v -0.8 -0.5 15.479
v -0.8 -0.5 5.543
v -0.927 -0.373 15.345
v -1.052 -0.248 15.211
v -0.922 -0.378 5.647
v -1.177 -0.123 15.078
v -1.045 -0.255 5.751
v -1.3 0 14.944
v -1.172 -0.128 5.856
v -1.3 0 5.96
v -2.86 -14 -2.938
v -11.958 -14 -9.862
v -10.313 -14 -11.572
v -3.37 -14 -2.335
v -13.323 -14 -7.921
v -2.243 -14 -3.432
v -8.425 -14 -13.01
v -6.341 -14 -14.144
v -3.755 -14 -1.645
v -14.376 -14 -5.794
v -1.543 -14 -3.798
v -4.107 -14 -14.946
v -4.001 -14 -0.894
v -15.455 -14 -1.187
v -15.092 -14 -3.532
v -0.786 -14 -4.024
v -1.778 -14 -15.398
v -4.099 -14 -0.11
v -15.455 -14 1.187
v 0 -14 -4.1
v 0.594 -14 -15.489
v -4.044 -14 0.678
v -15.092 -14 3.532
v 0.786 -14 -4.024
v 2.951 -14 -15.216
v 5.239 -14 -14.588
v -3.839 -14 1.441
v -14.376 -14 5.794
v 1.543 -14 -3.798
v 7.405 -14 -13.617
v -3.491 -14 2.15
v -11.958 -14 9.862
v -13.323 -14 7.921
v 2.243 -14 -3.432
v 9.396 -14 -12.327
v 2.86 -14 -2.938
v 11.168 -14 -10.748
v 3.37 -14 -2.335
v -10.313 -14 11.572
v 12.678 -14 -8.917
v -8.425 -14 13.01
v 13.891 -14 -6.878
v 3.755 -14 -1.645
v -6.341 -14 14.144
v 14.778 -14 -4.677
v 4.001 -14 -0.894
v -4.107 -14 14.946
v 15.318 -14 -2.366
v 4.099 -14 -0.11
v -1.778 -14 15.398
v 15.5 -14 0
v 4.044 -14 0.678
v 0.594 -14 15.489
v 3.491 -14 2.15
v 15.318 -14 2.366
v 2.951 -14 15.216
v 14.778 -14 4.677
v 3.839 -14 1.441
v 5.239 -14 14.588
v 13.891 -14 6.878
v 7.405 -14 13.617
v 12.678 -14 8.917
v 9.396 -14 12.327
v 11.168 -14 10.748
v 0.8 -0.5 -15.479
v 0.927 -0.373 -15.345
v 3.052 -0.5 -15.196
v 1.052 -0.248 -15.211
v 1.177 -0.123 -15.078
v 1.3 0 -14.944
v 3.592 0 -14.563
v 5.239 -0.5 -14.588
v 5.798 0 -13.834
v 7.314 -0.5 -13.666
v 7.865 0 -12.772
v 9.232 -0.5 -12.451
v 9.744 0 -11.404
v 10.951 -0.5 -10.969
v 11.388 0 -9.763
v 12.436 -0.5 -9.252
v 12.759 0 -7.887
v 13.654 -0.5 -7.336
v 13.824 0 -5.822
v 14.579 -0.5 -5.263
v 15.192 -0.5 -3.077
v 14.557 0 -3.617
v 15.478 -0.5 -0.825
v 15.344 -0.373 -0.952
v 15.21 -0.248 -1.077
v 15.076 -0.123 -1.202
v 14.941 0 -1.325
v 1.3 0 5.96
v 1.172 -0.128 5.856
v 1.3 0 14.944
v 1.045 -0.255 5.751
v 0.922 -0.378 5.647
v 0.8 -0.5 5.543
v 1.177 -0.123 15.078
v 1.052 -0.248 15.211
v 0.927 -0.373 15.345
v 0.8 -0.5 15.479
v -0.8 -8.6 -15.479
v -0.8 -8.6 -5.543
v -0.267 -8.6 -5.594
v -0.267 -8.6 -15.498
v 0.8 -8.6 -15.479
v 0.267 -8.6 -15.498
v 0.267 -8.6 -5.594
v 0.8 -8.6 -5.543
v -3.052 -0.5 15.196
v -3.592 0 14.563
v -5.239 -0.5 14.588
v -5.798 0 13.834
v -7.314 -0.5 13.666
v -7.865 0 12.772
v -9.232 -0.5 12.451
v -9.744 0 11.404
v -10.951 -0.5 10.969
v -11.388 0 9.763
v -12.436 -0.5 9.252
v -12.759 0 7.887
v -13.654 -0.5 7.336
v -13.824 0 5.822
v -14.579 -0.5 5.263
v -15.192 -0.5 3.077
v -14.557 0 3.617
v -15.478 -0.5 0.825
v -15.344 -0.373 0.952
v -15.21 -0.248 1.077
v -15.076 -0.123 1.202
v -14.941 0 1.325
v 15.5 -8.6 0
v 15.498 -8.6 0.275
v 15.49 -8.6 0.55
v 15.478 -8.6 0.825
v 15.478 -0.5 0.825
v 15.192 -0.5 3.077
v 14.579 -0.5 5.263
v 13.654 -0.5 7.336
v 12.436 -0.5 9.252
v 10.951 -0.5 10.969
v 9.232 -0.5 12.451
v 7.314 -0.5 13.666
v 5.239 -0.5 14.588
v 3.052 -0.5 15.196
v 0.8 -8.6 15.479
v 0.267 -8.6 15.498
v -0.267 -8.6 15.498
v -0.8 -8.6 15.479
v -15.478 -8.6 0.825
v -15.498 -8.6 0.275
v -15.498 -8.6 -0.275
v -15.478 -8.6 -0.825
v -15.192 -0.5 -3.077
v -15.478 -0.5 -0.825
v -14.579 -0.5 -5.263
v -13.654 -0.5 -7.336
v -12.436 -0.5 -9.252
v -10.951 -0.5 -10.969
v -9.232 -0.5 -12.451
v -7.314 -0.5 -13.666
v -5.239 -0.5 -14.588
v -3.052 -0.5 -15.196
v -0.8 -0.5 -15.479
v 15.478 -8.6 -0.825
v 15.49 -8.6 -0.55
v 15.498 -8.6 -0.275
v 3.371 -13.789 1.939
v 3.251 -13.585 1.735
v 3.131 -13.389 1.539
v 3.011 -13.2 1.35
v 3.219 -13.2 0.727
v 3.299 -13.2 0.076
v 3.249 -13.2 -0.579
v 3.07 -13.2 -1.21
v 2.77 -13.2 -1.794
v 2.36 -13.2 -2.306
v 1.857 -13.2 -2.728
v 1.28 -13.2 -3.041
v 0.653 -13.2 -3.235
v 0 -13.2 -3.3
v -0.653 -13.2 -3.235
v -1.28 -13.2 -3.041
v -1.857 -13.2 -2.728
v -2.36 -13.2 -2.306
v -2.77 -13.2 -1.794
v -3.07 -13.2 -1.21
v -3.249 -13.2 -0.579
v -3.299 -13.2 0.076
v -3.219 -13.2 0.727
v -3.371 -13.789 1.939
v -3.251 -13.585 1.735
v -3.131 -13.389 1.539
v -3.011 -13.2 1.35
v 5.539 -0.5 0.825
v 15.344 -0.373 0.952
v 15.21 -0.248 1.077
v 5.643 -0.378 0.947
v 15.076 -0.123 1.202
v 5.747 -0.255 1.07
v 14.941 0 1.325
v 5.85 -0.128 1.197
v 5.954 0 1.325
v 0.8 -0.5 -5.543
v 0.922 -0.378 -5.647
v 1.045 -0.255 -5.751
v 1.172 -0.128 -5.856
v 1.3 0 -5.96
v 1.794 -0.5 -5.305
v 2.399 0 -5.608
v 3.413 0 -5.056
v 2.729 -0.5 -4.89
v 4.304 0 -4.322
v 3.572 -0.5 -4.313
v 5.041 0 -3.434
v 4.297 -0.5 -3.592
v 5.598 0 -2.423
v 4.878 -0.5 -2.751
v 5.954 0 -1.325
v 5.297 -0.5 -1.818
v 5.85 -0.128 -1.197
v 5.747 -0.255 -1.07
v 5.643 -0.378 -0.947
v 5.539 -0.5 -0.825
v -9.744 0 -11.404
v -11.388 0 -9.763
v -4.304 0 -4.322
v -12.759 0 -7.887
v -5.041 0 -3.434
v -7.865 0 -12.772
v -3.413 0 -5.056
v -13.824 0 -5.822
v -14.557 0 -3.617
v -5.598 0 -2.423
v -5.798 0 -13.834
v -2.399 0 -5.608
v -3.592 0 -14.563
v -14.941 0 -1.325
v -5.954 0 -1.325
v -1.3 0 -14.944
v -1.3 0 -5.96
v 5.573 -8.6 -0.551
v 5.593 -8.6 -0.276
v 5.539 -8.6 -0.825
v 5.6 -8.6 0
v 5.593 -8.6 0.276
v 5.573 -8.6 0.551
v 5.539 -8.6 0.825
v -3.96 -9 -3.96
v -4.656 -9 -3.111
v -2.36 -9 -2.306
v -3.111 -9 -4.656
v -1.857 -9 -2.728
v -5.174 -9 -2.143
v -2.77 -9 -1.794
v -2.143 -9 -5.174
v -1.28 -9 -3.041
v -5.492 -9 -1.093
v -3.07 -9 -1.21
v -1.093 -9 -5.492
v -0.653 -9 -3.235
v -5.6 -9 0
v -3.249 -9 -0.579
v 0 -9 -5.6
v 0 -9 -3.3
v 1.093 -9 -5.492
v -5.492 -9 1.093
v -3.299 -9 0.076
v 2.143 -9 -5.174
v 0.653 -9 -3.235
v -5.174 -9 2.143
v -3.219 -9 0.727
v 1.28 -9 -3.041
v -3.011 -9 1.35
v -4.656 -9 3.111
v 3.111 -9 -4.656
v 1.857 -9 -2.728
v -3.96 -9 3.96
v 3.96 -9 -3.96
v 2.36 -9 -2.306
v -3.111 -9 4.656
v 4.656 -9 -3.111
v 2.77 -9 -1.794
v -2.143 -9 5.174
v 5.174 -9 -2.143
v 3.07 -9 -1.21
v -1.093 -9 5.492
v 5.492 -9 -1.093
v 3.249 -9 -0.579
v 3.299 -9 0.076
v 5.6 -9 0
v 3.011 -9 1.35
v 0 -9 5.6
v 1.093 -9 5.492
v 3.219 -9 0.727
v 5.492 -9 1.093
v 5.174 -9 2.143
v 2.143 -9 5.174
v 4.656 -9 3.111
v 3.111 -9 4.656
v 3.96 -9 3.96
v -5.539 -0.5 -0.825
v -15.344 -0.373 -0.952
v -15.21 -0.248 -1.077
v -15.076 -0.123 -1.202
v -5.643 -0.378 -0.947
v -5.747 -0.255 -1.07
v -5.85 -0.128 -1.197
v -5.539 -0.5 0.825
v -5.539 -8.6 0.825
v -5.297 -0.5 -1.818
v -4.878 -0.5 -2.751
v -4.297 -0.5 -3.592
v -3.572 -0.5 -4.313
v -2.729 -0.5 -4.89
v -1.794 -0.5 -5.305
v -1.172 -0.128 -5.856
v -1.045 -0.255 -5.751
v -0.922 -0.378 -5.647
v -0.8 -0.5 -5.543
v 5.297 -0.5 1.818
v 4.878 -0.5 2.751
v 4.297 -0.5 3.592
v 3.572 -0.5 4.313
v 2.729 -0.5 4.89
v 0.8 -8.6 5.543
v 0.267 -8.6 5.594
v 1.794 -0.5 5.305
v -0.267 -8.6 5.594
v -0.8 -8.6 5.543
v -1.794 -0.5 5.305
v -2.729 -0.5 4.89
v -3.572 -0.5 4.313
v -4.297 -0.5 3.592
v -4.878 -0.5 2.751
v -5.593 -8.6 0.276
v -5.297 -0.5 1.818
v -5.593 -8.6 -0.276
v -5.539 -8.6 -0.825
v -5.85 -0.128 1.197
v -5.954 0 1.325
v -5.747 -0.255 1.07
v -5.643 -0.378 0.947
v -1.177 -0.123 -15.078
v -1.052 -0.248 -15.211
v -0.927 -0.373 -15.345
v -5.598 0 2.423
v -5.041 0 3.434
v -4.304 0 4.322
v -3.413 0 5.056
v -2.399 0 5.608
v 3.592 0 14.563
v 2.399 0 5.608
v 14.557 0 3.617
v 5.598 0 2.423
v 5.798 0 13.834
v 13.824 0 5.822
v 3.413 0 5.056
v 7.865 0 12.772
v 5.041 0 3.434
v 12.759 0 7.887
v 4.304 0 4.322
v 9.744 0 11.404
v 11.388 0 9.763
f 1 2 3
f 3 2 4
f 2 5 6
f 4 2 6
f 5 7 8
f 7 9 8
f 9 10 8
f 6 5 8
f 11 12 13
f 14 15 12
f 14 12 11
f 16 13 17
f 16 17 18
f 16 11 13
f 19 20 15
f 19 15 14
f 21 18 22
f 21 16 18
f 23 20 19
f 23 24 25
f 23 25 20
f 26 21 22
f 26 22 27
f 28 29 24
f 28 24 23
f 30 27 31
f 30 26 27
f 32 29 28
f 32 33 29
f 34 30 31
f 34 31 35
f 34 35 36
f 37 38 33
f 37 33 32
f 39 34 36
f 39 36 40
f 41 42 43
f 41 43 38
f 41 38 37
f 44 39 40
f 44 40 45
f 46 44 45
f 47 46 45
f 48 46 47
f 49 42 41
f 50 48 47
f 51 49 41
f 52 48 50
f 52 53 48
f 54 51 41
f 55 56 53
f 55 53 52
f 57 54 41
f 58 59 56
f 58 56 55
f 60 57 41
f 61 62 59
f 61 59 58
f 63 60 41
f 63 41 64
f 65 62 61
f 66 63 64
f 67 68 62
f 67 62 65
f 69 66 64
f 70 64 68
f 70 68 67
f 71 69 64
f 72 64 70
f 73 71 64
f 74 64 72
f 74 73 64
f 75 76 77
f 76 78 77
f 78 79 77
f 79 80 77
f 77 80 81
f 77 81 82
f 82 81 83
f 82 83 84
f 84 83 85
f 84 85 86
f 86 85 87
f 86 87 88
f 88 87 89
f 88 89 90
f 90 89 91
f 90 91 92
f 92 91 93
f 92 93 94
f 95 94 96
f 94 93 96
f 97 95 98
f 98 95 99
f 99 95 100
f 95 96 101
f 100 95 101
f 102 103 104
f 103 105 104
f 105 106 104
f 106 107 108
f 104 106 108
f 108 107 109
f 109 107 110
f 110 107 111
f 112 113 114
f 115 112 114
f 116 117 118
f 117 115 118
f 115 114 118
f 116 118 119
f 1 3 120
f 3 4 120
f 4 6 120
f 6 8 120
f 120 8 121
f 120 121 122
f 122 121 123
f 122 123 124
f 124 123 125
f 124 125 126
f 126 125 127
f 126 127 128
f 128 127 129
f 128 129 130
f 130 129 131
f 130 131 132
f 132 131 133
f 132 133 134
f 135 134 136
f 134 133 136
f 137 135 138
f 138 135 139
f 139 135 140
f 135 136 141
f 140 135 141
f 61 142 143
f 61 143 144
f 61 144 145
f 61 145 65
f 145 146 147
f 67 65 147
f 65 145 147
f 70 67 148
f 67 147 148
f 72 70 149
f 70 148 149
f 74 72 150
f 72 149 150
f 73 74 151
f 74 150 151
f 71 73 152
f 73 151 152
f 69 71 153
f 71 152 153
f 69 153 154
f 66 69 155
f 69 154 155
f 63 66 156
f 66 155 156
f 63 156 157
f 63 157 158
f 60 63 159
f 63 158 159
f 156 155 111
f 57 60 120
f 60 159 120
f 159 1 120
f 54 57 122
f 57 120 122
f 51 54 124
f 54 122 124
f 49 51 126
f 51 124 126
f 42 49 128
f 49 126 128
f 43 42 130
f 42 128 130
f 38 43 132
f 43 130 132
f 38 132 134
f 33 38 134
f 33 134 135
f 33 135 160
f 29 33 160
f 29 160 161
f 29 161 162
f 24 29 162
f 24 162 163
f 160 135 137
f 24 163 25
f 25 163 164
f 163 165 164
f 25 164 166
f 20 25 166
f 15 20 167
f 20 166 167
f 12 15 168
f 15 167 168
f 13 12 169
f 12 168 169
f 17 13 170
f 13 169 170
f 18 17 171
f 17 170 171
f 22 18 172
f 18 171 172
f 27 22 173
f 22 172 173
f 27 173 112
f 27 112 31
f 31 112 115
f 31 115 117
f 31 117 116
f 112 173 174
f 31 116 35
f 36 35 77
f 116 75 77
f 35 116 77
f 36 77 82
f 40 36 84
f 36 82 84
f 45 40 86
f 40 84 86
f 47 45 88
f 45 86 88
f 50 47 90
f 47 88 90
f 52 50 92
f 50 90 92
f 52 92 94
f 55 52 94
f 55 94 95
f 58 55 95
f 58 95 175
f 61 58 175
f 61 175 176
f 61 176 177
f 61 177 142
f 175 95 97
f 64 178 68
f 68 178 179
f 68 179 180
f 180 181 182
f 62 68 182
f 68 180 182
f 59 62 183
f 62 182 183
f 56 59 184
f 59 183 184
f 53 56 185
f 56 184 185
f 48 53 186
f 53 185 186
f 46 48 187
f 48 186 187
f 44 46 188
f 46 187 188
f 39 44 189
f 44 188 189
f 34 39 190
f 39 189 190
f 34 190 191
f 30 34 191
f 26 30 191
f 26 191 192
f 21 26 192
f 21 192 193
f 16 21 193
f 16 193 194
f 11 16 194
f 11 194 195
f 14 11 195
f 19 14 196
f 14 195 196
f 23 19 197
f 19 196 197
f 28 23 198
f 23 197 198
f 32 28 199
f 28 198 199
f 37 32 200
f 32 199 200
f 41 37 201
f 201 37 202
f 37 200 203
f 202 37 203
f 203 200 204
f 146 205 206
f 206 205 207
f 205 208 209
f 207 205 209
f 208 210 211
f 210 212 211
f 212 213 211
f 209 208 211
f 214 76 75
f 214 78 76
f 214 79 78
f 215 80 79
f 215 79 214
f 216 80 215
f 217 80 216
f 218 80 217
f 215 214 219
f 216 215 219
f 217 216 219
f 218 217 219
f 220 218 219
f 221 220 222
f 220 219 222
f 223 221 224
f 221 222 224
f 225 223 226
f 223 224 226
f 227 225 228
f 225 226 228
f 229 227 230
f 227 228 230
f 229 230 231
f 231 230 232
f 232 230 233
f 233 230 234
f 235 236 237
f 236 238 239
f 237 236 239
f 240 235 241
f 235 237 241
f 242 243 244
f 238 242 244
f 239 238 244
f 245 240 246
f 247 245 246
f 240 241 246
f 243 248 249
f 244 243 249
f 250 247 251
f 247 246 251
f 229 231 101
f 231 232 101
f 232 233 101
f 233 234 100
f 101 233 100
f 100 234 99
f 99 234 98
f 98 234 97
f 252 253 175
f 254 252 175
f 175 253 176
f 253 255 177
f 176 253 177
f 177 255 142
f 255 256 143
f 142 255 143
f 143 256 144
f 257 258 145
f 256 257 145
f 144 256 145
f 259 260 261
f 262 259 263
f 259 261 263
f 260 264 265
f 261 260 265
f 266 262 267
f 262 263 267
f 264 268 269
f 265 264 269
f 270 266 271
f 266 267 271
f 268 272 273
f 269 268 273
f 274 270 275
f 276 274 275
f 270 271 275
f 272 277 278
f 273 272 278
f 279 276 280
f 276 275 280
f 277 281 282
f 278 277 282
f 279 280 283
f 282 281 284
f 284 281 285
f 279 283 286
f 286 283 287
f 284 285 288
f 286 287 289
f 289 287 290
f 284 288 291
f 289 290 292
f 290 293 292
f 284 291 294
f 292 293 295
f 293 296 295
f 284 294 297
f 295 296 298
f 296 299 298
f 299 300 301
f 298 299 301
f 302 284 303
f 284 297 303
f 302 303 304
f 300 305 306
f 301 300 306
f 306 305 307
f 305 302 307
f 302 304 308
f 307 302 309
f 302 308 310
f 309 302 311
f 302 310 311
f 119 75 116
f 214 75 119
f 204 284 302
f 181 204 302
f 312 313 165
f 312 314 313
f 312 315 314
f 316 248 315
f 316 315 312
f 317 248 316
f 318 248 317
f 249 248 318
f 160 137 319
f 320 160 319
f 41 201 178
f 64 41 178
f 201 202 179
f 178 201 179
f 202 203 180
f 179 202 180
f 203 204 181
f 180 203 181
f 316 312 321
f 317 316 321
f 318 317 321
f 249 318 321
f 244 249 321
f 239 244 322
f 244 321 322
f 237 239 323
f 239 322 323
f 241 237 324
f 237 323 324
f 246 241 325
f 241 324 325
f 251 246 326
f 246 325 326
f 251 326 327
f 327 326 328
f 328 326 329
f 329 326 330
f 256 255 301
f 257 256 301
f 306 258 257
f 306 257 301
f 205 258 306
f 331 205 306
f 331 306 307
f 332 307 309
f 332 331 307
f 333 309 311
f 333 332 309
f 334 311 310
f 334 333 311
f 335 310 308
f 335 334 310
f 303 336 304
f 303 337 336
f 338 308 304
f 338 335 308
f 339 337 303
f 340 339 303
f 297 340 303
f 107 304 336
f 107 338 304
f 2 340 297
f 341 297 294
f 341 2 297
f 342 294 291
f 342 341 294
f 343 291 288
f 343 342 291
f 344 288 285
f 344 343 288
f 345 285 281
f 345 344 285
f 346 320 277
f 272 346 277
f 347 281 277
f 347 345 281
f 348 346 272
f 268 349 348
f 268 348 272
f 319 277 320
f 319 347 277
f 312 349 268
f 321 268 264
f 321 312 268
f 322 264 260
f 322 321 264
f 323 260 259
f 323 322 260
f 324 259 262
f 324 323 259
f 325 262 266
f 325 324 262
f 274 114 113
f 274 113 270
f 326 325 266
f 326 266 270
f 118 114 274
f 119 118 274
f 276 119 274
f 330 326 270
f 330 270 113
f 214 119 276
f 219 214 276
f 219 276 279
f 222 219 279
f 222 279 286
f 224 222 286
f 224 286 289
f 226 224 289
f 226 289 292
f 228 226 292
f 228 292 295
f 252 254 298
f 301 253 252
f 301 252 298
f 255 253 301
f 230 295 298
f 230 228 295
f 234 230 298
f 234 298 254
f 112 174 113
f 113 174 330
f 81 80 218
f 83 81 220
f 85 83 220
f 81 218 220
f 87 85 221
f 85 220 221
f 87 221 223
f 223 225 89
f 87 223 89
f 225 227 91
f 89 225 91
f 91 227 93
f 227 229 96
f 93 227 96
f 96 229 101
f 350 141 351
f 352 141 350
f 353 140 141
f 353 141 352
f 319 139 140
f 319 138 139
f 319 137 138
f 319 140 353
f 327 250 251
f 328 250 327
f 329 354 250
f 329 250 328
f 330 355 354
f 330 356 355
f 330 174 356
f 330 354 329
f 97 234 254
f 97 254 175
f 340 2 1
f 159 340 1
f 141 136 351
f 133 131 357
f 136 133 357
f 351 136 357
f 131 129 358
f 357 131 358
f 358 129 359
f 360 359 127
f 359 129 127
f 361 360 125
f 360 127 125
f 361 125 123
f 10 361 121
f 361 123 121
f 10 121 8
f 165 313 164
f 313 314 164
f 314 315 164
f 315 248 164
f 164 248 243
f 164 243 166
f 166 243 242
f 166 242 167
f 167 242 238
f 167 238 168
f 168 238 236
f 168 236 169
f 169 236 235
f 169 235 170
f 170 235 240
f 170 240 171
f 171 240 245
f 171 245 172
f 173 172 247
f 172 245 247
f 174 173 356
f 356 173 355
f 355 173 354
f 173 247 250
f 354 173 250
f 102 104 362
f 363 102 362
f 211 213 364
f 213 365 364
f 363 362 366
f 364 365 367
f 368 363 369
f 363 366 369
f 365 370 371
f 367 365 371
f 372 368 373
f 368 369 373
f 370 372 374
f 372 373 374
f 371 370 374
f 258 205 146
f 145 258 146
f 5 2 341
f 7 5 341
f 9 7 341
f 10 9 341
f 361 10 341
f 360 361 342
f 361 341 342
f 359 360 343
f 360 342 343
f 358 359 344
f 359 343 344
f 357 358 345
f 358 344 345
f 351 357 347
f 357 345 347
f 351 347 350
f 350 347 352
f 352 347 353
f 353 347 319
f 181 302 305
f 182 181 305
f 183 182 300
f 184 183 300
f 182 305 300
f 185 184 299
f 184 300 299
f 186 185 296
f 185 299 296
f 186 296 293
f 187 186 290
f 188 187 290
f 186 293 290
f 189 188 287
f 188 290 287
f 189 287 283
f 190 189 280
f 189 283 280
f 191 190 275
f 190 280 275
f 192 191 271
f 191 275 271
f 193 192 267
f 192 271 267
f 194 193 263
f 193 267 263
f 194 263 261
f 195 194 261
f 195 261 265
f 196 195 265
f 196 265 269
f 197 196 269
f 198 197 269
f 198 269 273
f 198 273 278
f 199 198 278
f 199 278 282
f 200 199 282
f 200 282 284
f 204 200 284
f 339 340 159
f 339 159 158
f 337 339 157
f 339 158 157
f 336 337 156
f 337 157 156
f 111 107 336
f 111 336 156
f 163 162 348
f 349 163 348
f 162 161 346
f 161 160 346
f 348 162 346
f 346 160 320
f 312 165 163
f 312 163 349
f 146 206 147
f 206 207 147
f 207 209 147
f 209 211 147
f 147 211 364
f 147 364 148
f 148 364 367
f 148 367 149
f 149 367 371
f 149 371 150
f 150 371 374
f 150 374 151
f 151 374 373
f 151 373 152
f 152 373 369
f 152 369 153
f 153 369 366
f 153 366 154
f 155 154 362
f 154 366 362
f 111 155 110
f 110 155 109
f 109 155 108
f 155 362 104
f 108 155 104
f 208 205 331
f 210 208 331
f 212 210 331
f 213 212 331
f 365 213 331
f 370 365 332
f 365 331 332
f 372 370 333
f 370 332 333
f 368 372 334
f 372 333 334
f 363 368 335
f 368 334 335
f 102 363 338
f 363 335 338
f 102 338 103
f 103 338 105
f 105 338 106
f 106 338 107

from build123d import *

# Parameters (mm, degrees)
F0_R     = 15.5
F1_DEPTH = 14
F2_W     = 36
F2_H     = 1.65
F3_DEPTH = 8.6
F4_W     = 1.6
F4_H     = 40
F5_DEPTH = 8.6
F6_R     = 5.6
F7_DEPTH = 9
F8_SIZE  = 0.8
F9_SIZE  = 0.5


with BuildPart() as f1:
    # F0 (on Front) → F1 (new body)
    with BuildSketch(Plane.XZ):
        Circle(F0_R)
        with BuildLine():
            ThreePointArc((3.011229, 1.35), (0, -3.3), (-3.011229, 1.35))
            Line((-3.011229, 1.35), (3.011229, 1.35))
        make_face(mode=Mode.SUBTRACT)
    extrude(amount=F1_DEPTH)

    # F2 (on Front) → F3 (cut)
    with BuildSketch(Plane.XZ):
        Rectangle(F2_W, F2_H)
    extrude(amount=F3_DEPTH, mode=Mode.SUBTRACT)

    # F4 (on Front) → F5 (cut)
    with BuildSketch(Plane.XZ):
        Rectangle(F4_W, F4_H)
    extrude(amount=F5_DEPTH, mode=Mode.SUBTRACT)

    # F6 (on Front) → F7 (cut)
    with BuildSketch(Plane.XZ):
        Circle(F6_R)
    extrude(amount=F7_DEPTH, mode=Mode.SUBTRACT)

    # F8
    f8_edges = [f1.edges().sort_by_distance(p)[0] for p in [
        (0, -14, 1.35),
        (0, -14, -3.3),
    ]]
    chamfer(f8_edges, length=F8_SIZE)

    # F9
    f9_edges = [f1.edges().sort_by_distance(p)[0] for p in [
        (10.508463, 0, 0.825),
        (-10.508463, 0, 0.825),
        (-10.508463, 0, -0.825),
        (10.508463, 0, -0.825),
        (-0.8, 0, 10.510952),
        (-0.8, 0, -10.510952),
        (0.8, 0, 10.510952),
        (0.8, 0, -10.510952),
        (3.950855, 0, 3.968721),
        (-3.950855, 0, 3.968721),
        (-3.950855, 0, -3.968721),
        (3.950855, 0, -3.968721),
        (10.951301, 0, 10.969003),
        (-10.951301, 0, 10.969003),
        (-10.951301, 0, -10.969003),
        (10.951301, 0, -10.969003),
    ]]
    chamfer(f9_edges, length=F9_SIZE)


solid = f1.part
